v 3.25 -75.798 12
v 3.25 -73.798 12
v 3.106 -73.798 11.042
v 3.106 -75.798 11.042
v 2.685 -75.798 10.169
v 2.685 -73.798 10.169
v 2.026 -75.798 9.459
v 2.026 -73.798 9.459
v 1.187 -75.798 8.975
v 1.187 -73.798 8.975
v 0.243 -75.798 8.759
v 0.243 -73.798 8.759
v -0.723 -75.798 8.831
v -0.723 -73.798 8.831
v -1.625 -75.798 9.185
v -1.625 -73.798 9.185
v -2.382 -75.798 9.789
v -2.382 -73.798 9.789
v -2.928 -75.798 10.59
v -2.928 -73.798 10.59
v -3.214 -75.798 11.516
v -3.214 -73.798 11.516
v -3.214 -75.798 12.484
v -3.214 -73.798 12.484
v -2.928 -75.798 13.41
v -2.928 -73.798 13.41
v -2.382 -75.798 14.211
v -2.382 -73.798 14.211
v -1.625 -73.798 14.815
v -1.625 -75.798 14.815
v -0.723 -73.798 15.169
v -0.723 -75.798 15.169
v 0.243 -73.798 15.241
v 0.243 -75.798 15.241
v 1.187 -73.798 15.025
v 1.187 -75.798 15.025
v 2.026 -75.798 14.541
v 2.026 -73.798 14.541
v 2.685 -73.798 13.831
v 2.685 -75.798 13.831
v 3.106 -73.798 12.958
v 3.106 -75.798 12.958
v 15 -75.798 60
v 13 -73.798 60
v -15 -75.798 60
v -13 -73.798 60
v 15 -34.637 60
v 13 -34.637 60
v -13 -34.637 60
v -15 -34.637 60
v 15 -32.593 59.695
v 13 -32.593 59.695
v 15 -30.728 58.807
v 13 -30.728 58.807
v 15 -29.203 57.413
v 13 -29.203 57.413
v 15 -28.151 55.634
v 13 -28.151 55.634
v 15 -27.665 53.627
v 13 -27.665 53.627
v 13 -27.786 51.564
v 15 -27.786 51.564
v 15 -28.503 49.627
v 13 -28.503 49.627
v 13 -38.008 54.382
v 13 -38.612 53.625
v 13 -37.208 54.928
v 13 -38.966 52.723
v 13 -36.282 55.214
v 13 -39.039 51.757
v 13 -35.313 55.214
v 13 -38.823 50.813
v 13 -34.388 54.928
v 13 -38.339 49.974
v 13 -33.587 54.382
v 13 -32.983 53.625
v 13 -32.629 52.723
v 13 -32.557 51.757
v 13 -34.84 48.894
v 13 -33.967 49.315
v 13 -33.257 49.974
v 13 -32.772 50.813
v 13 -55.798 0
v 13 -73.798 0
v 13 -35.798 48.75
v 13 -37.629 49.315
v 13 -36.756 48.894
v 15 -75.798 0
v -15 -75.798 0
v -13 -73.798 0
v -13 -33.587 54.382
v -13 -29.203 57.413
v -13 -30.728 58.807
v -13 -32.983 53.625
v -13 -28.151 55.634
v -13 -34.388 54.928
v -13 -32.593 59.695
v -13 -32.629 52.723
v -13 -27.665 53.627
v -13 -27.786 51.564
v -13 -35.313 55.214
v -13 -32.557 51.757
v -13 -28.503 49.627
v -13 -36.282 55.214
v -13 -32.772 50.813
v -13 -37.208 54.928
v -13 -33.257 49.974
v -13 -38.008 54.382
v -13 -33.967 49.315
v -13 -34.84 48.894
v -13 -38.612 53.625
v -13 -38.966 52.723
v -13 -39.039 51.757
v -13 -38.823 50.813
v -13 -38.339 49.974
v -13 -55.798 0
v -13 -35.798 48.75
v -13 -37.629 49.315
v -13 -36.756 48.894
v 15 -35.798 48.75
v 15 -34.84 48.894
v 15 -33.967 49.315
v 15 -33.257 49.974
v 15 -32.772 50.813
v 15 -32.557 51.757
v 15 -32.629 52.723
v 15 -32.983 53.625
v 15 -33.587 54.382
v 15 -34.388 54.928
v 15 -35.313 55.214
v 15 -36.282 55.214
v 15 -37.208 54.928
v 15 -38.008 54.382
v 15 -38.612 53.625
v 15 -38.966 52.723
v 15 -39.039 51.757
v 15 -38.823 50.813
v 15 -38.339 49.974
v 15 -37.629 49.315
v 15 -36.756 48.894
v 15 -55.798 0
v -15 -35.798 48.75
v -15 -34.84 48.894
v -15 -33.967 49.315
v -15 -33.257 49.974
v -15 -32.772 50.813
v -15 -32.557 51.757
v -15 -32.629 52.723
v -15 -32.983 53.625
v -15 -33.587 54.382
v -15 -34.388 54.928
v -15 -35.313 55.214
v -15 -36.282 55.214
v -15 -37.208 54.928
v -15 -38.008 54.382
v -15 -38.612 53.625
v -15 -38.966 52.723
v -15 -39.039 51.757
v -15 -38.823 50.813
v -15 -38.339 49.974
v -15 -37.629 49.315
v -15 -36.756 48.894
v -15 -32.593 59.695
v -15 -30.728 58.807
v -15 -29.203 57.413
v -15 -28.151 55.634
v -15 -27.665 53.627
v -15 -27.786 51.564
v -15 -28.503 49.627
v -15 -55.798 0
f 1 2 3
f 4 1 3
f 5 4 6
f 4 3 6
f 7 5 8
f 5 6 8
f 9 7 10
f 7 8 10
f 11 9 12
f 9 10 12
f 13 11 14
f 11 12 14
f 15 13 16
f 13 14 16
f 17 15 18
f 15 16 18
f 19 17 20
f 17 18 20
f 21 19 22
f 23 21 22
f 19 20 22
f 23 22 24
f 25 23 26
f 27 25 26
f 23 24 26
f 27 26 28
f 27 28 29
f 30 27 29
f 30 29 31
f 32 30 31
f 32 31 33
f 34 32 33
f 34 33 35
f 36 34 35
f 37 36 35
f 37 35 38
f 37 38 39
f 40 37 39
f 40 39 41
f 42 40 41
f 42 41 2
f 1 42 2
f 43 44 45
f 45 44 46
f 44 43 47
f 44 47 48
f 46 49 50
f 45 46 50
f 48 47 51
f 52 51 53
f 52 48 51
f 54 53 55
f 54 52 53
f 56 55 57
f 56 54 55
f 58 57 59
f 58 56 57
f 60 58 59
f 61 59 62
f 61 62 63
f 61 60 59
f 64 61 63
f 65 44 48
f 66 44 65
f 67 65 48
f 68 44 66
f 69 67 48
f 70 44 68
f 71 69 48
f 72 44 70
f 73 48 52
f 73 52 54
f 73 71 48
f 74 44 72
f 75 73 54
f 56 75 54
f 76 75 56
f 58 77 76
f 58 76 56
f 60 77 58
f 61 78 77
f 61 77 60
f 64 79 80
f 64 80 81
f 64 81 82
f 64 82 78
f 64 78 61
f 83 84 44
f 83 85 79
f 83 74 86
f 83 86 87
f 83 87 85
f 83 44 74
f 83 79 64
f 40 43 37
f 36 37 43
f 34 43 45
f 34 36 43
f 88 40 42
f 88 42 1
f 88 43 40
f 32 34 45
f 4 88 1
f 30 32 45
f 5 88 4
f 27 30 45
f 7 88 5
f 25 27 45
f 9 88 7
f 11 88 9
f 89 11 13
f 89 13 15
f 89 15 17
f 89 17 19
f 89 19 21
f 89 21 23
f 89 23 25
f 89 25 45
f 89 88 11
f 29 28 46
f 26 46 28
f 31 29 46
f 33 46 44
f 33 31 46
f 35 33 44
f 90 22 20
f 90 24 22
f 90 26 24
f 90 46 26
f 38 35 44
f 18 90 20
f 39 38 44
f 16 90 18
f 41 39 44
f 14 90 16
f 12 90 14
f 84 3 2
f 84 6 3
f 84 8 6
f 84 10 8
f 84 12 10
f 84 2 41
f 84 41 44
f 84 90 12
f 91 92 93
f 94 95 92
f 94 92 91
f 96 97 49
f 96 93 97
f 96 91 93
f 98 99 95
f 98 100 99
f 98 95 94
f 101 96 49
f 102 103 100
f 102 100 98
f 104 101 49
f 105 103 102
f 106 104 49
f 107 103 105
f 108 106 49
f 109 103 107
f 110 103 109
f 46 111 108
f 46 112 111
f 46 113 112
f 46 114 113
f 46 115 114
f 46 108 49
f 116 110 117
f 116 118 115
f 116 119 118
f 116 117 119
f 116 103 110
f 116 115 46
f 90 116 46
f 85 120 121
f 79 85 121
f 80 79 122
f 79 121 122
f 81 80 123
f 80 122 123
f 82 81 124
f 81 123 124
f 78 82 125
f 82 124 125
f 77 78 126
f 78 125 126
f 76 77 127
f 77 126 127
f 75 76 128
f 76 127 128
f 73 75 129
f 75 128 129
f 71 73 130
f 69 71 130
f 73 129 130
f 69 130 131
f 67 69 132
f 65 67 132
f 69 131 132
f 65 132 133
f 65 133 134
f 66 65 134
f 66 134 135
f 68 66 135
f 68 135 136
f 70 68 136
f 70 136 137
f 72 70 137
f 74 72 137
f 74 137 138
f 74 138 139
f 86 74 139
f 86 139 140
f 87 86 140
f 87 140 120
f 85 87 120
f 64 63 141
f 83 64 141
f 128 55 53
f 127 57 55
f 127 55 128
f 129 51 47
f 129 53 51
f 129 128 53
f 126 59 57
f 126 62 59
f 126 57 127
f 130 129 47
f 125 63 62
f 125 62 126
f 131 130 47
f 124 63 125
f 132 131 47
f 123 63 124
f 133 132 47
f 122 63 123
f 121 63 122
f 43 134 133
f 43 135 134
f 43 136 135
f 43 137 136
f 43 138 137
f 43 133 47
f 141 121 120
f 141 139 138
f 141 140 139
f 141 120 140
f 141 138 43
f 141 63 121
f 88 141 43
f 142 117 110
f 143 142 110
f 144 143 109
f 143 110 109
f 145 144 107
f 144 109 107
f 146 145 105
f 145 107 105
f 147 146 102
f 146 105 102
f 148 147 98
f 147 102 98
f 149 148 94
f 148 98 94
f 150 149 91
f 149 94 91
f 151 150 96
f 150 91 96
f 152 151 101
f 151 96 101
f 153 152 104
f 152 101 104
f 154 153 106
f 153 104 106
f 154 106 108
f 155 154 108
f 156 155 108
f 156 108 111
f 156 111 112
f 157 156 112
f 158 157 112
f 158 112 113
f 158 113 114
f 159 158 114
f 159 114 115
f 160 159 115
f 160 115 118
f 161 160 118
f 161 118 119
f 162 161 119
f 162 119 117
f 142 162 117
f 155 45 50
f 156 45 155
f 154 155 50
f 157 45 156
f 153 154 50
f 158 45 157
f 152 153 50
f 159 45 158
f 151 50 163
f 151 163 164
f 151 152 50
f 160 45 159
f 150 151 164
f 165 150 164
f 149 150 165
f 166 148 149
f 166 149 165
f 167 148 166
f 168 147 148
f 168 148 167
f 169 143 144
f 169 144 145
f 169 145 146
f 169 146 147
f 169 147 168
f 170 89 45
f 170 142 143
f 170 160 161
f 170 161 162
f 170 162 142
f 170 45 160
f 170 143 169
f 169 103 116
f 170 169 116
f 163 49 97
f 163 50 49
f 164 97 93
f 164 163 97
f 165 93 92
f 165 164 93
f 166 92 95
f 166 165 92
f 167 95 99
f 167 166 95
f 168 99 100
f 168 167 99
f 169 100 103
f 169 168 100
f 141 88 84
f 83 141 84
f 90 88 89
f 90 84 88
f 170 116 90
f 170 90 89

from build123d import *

# Parameters (mm, degrees)
EXTRUDE_1_DEPTH     = 60
SKETCH_2_R          = 3.25
CUT_EXTRUDE_1_DEPTH = 31
FILLET_1_R          = 7
SKETCH_3_R          = 3.25
CUT_EXTRUDE_2_DEPTH = 3


with BuildPart() as part:
    # 草图1 → 凸台-拉伸1 (new body)
    with BuildSketch(Plane.XY):
        Polygon((-13, -20.797836643), (-13, -73.797836643), (13, -73.797836643), (13, -20.797836643), (15, -20.797836643), (15, -75.797836643), (-15, -75.797836643), (-15, -20.797836643), align=None)
    extrude(amount=EXTRUDE_1_DEPTH)

    # 草图2 → 切除-拉伸1 (cut, through all)
    with BuildSketch(Plane(origin=(15, 0, 0), x_dir=(0, 0, -1), z_dir=(1, 0, 0))):
        with Locations((-52, -35.797836643)):
            Circle(SKETCH_2_R)
        Polygon((-60, -20.797836643), (-60, -22.797836643), (0, -55.797836643), (0, -20.797836643), align=None)
    extrude(amount=-CUT_EXTRUDE_1_DEPTH, mode=Mode.SUBTRACT)

    # 圆角1
    fillet_1_edges = [part.edges().sort_by_distance(p)[0] for p in [
        (14, -22.797836643, 60),
        (-14, -22.797836643, 60),
    ]]
    fillet(fillet_1_edges, radius=FILLET_1_R)

    # 草图3 → 切除-拉伸2 (cut, through all)
    with BuildSketch(Plane(origin=(0, -73.797836643, 0), x_dir=(1, 0, 0), z_dir=(0, 1, 0))):
        with Locations((0, -12)):
            Circle(SKETCH_3_R)
    extrude(amount=-CUT_EXTRUDE_2_DEPTH, mode=Mode.SUBTRACT)


solid = part.part
